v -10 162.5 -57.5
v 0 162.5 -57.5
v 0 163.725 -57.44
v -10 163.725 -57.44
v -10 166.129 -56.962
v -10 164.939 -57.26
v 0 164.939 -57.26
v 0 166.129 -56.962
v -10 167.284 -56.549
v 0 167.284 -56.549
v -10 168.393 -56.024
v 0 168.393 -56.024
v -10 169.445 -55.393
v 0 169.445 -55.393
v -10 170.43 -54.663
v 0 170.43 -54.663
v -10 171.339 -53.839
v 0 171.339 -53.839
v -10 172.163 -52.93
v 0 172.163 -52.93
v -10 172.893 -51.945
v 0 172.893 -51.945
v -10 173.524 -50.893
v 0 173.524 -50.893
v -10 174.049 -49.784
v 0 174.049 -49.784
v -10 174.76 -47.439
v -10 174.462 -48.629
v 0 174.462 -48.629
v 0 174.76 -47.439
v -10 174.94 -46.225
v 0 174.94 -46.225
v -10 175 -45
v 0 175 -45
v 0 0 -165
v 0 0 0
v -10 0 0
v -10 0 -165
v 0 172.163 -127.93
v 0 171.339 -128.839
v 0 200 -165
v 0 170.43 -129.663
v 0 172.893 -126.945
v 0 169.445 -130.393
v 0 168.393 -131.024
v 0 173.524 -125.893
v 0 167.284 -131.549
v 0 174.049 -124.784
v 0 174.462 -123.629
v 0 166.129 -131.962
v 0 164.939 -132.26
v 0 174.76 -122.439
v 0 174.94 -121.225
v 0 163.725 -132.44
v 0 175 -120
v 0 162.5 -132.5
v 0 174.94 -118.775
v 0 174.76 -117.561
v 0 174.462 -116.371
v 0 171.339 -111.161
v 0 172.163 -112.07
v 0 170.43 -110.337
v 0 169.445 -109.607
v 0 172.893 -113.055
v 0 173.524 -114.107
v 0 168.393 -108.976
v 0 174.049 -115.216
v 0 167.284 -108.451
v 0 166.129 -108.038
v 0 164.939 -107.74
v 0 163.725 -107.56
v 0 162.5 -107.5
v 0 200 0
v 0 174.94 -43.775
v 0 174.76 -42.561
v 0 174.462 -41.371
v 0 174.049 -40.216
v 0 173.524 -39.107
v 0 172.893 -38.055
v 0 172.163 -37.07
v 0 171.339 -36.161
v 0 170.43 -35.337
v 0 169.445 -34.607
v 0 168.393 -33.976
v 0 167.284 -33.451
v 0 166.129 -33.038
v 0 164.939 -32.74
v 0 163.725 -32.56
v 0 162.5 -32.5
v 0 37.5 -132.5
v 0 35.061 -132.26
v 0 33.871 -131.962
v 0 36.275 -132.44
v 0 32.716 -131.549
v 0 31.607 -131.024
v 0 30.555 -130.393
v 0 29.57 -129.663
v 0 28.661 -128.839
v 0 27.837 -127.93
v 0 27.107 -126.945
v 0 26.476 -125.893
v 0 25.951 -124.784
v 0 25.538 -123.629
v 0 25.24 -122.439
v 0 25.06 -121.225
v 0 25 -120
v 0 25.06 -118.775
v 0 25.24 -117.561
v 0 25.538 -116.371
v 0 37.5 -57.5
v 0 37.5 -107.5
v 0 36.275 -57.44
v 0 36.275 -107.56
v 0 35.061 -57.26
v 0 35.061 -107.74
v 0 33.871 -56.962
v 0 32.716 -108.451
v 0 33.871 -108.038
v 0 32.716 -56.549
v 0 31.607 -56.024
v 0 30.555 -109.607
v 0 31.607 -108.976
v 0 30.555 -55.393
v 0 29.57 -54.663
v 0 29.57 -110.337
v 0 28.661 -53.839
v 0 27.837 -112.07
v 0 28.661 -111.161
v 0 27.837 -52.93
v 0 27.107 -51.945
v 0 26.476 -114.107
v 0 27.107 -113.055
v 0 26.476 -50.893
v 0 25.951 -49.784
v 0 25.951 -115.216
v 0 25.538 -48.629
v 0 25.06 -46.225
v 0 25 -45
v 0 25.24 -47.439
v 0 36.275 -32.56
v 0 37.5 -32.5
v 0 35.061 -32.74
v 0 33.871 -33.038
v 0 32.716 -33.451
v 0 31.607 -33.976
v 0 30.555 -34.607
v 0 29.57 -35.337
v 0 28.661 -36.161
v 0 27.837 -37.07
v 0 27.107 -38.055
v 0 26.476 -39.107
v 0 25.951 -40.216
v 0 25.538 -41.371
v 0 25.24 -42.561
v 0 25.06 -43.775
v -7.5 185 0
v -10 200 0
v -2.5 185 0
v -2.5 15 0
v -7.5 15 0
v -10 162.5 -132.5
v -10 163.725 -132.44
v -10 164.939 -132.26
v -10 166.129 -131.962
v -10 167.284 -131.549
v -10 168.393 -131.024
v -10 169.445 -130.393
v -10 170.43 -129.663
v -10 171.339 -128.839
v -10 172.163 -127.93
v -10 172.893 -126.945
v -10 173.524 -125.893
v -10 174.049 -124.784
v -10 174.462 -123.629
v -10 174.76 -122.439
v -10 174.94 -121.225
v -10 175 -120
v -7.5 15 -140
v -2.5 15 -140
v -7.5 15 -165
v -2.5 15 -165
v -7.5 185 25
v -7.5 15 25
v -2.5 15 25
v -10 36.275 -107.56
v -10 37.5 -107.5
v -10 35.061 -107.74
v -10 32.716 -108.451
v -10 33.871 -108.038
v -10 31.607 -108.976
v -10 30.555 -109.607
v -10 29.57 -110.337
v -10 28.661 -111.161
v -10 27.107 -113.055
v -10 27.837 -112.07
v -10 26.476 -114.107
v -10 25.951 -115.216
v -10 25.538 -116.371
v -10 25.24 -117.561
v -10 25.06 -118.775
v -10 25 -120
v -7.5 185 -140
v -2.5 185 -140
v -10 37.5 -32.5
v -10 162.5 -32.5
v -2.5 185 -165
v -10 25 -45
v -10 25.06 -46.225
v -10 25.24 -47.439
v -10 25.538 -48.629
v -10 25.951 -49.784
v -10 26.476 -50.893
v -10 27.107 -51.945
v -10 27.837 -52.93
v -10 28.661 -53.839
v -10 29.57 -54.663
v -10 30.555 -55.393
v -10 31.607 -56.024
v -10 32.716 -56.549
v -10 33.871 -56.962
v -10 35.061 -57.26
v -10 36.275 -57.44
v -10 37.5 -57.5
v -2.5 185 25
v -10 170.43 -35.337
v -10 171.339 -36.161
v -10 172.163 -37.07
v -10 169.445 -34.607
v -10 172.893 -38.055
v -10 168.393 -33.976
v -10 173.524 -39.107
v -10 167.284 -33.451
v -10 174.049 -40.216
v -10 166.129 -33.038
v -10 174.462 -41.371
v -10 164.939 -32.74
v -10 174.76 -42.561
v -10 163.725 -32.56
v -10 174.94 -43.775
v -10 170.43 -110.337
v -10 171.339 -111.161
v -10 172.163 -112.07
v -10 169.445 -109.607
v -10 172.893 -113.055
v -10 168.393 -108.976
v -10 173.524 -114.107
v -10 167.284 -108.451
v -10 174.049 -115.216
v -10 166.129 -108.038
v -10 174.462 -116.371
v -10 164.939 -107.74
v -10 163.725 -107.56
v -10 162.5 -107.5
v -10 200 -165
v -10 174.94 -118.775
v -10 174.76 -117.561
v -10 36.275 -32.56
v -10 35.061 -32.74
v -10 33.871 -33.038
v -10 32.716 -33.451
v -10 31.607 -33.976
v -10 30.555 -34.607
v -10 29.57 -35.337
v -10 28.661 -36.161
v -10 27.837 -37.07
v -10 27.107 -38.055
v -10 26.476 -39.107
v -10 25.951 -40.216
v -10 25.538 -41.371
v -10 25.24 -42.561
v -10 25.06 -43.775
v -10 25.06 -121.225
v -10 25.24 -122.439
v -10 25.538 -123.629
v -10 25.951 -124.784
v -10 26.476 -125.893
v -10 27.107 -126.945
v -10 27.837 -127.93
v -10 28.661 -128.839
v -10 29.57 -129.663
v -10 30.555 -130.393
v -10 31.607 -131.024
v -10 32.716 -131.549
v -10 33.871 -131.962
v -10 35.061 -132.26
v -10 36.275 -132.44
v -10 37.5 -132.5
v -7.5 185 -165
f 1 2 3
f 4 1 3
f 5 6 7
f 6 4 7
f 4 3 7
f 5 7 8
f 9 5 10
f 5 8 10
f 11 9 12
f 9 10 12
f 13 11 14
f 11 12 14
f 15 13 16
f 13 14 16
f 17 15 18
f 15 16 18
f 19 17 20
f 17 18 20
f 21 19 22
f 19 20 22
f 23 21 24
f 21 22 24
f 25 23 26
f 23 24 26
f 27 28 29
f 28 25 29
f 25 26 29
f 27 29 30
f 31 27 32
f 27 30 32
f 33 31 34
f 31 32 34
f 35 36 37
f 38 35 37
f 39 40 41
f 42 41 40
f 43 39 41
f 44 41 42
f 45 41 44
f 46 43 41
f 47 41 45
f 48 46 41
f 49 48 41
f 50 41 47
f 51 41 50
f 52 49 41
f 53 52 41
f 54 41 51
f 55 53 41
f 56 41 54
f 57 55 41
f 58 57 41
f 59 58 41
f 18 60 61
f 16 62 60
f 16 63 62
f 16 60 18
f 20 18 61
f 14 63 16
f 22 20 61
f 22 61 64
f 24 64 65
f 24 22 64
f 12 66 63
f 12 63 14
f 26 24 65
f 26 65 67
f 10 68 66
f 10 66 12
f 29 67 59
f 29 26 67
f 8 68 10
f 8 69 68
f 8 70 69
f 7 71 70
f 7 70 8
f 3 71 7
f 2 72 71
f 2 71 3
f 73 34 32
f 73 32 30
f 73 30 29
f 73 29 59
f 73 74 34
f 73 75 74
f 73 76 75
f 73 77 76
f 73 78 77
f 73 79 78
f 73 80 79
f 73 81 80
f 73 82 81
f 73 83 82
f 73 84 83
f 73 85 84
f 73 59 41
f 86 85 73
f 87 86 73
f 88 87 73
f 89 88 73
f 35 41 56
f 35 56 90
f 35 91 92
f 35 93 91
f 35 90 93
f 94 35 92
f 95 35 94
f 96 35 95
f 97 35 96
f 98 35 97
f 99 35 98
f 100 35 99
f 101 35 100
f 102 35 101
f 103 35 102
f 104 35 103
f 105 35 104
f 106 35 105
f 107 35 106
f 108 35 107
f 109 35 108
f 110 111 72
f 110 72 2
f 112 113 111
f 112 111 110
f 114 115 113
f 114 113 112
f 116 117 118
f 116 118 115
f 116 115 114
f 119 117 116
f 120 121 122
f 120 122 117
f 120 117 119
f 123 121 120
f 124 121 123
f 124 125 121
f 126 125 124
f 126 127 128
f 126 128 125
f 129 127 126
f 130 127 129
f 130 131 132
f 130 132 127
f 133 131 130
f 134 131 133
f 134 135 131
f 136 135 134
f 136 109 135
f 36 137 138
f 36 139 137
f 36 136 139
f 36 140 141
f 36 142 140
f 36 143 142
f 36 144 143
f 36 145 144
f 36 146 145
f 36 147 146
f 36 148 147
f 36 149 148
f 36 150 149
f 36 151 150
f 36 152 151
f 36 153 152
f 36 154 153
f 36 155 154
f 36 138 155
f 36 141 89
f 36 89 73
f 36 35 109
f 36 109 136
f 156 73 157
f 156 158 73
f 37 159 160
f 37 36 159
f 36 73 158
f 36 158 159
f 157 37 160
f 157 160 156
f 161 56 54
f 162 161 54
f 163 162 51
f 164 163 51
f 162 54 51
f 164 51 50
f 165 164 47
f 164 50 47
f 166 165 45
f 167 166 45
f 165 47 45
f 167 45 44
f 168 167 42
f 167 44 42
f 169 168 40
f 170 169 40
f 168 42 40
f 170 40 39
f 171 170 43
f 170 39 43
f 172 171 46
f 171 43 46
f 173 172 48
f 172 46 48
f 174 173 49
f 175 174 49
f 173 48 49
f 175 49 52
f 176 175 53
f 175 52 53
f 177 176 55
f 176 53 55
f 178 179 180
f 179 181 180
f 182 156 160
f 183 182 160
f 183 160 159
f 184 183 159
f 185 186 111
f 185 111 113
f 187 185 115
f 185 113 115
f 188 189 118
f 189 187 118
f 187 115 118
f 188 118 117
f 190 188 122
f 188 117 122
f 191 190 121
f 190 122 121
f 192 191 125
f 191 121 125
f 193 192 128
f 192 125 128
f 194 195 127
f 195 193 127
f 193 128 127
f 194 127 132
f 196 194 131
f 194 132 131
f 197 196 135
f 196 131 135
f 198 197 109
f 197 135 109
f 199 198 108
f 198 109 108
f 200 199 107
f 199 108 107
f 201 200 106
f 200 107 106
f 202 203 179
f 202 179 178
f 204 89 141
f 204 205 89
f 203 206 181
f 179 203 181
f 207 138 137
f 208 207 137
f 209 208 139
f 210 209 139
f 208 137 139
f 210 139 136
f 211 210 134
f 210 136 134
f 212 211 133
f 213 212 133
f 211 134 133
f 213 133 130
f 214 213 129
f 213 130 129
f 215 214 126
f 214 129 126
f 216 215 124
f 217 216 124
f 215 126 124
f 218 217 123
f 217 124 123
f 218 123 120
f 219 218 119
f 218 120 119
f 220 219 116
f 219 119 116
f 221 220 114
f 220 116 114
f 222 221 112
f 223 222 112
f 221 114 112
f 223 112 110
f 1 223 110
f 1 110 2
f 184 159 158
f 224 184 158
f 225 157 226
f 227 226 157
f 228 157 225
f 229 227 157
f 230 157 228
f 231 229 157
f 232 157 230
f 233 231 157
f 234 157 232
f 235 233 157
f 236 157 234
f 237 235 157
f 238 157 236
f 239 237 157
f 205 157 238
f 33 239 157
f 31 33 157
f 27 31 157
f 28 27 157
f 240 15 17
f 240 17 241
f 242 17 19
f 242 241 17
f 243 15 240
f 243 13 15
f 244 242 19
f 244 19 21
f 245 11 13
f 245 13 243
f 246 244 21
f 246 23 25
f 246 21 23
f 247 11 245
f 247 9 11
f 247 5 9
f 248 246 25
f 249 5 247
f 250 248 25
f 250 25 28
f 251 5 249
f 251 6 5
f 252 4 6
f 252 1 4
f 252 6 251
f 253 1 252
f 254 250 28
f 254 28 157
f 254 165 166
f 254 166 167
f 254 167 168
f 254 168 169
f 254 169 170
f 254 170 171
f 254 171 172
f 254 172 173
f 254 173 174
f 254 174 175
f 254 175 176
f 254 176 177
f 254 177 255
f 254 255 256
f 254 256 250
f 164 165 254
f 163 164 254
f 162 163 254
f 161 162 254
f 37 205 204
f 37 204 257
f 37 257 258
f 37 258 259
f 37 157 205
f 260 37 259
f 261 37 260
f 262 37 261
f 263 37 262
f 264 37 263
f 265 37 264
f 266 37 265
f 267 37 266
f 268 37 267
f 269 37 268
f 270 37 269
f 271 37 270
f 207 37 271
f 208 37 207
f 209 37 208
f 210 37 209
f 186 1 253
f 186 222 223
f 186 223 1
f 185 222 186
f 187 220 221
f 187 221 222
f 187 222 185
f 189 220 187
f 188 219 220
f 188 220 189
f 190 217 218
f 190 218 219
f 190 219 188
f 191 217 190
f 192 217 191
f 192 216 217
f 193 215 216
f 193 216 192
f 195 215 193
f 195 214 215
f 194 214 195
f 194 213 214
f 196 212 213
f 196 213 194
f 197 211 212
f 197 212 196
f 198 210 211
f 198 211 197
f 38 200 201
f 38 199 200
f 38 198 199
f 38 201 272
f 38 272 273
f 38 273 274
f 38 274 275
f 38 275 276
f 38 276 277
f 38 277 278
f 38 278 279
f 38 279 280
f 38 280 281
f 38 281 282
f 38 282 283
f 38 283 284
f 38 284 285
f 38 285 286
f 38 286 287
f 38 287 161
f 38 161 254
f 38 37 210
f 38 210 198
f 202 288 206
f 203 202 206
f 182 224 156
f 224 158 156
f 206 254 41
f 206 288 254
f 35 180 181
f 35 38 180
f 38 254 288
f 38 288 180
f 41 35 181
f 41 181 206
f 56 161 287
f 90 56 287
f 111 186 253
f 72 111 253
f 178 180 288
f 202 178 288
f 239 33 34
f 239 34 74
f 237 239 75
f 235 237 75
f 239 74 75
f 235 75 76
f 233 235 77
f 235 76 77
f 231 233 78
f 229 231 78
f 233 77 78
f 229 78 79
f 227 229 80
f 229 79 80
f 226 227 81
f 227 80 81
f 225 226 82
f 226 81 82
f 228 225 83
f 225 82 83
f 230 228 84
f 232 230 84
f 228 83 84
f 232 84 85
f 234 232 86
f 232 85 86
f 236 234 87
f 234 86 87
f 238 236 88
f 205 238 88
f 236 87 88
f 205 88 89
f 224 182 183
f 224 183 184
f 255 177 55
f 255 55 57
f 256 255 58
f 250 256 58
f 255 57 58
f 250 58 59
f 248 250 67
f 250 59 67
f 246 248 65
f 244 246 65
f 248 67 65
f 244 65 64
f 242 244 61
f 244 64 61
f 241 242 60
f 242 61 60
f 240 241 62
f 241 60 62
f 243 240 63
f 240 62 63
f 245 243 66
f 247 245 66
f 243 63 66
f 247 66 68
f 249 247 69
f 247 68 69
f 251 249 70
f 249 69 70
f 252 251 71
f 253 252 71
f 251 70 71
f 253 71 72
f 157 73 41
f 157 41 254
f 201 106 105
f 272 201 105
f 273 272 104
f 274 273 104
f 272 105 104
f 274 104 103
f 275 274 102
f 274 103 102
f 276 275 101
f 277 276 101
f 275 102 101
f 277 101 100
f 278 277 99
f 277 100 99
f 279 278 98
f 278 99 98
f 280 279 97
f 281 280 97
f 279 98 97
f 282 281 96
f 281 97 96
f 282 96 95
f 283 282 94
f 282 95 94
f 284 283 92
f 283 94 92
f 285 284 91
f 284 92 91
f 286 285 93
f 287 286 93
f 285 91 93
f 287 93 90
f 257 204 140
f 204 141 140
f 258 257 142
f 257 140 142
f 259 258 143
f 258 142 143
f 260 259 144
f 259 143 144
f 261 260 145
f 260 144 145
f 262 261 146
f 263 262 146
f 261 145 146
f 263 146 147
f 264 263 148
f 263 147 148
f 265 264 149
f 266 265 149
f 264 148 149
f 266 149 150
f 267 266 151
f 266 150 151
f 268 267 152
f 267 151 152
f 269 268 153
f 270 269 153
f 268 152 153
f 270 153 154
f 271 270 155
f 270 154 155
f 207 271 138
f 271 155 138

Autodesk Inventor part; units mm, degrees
ref_plane "YZ Plane" through (0, 0, 0) normal (1, 0, 0) x (0, 1, 0)
ref_plane "XZ Plane" through (0, 0, 0) normal (0, 1, 0) x (-1, 0, 0)
ref_plane "XY Plane" through (0, 0, 0) normal (0, 0, 1) x (1, 0, 0)
sketch "Sketch1" plane through (0, 0, 0) normal (0, 1, 0) x (-1, 0, 0)
  line L0 (0, 0) -> (10, 0)
  line L1 (10, 0) -> (10, -165)
  line L2 (10, -165) -> (0, -165)
  line L3 (0, -165) -> (0, 0)
  dimension "d0" = 10
  dimension "d1" = 165
extrude "Extrusion1" add sketch "Sketch1" along normal blind 200
sketch "Sketch2" plane through (-10, 0, 0) normal (0, 0, 1) x (1, 0, 0)
  line L0 (2.5, 15) -> (7.5, 15)
  line L1 (7.5, 15) -> (7.5, 185)
  line L2 (7.5, 185) -> (2.5, 185)
  line L3 (2.5, 185) -> (2.5, 15)
  point P0 (10, 0)
  dimension "d4" = 5
  dimension "d5" = 170
extrude "Extrusion2" add sketch "Sketch2" along normal blind 25
sketch "Sketch3" plane through (0, 0, -165) normal (0, 0, -1) x (-1, 0, 0)
  line L0 (2.5, 15) -> (7.5, 15)
  line L1 (7.5, 15) -> (7.5, 185)
  line L2 (7.5, 185) -> (2.5, 185)
  line L3 (2.5, 185) -> (2.5, 15)
  point P0 (0, 0)
  dimension "d8" = 5
  dimension "d9" = 170
extrude "Extrusion3" cut sketch "Sketch3" against normal blind 25
sketch "Sketch4" plane through (-10, 0, -165) normal (-1, 0, 0) x (0, 0, 1)
  line L0 (0, 200) -> (165, 200) construction
  line L1 (82.5, 200) -> (82.5, 0) construction
  line L2 (0, 0) -> (165, 0) construction
  line L3 (107.5, 175) -> (132.5, 175)
  line L4 (132.5, 175) -> (132.5, 25)
  line L5 (132.5, 25) -> (107.5, 25)
  line L6 (107.5, 25) -> (107.5, 175)
  line L7 (57.5, 175) -> (32.5, 175)
  line L8 (32.5, 175) -> (32.5, 25)
  line L9 (32.5, 25) -> (57.5, 25)
  line L10 (57.5, 25) -> (57.5, 175)
  dimension "d12" = 25
  dimension "d13" = 150
  dimension "d14" = 25
  dimension "d15" = 150
extrude "Extrusion4" cut sketch "Sketch4" against normal blind 10
fillet "Fillet1" radius 12.5 8 edges at (-5, 175, -107.5) (-5, 175, -32.5) (-5, 175, -57.5) (-5, 175, -132.5) (-5, 25, -132.5) (-5, 25, -107.5) (-5, 25, -57.5) (-5, 25, -32.5)
properties part number "TSU_FM_Side_Wall"
